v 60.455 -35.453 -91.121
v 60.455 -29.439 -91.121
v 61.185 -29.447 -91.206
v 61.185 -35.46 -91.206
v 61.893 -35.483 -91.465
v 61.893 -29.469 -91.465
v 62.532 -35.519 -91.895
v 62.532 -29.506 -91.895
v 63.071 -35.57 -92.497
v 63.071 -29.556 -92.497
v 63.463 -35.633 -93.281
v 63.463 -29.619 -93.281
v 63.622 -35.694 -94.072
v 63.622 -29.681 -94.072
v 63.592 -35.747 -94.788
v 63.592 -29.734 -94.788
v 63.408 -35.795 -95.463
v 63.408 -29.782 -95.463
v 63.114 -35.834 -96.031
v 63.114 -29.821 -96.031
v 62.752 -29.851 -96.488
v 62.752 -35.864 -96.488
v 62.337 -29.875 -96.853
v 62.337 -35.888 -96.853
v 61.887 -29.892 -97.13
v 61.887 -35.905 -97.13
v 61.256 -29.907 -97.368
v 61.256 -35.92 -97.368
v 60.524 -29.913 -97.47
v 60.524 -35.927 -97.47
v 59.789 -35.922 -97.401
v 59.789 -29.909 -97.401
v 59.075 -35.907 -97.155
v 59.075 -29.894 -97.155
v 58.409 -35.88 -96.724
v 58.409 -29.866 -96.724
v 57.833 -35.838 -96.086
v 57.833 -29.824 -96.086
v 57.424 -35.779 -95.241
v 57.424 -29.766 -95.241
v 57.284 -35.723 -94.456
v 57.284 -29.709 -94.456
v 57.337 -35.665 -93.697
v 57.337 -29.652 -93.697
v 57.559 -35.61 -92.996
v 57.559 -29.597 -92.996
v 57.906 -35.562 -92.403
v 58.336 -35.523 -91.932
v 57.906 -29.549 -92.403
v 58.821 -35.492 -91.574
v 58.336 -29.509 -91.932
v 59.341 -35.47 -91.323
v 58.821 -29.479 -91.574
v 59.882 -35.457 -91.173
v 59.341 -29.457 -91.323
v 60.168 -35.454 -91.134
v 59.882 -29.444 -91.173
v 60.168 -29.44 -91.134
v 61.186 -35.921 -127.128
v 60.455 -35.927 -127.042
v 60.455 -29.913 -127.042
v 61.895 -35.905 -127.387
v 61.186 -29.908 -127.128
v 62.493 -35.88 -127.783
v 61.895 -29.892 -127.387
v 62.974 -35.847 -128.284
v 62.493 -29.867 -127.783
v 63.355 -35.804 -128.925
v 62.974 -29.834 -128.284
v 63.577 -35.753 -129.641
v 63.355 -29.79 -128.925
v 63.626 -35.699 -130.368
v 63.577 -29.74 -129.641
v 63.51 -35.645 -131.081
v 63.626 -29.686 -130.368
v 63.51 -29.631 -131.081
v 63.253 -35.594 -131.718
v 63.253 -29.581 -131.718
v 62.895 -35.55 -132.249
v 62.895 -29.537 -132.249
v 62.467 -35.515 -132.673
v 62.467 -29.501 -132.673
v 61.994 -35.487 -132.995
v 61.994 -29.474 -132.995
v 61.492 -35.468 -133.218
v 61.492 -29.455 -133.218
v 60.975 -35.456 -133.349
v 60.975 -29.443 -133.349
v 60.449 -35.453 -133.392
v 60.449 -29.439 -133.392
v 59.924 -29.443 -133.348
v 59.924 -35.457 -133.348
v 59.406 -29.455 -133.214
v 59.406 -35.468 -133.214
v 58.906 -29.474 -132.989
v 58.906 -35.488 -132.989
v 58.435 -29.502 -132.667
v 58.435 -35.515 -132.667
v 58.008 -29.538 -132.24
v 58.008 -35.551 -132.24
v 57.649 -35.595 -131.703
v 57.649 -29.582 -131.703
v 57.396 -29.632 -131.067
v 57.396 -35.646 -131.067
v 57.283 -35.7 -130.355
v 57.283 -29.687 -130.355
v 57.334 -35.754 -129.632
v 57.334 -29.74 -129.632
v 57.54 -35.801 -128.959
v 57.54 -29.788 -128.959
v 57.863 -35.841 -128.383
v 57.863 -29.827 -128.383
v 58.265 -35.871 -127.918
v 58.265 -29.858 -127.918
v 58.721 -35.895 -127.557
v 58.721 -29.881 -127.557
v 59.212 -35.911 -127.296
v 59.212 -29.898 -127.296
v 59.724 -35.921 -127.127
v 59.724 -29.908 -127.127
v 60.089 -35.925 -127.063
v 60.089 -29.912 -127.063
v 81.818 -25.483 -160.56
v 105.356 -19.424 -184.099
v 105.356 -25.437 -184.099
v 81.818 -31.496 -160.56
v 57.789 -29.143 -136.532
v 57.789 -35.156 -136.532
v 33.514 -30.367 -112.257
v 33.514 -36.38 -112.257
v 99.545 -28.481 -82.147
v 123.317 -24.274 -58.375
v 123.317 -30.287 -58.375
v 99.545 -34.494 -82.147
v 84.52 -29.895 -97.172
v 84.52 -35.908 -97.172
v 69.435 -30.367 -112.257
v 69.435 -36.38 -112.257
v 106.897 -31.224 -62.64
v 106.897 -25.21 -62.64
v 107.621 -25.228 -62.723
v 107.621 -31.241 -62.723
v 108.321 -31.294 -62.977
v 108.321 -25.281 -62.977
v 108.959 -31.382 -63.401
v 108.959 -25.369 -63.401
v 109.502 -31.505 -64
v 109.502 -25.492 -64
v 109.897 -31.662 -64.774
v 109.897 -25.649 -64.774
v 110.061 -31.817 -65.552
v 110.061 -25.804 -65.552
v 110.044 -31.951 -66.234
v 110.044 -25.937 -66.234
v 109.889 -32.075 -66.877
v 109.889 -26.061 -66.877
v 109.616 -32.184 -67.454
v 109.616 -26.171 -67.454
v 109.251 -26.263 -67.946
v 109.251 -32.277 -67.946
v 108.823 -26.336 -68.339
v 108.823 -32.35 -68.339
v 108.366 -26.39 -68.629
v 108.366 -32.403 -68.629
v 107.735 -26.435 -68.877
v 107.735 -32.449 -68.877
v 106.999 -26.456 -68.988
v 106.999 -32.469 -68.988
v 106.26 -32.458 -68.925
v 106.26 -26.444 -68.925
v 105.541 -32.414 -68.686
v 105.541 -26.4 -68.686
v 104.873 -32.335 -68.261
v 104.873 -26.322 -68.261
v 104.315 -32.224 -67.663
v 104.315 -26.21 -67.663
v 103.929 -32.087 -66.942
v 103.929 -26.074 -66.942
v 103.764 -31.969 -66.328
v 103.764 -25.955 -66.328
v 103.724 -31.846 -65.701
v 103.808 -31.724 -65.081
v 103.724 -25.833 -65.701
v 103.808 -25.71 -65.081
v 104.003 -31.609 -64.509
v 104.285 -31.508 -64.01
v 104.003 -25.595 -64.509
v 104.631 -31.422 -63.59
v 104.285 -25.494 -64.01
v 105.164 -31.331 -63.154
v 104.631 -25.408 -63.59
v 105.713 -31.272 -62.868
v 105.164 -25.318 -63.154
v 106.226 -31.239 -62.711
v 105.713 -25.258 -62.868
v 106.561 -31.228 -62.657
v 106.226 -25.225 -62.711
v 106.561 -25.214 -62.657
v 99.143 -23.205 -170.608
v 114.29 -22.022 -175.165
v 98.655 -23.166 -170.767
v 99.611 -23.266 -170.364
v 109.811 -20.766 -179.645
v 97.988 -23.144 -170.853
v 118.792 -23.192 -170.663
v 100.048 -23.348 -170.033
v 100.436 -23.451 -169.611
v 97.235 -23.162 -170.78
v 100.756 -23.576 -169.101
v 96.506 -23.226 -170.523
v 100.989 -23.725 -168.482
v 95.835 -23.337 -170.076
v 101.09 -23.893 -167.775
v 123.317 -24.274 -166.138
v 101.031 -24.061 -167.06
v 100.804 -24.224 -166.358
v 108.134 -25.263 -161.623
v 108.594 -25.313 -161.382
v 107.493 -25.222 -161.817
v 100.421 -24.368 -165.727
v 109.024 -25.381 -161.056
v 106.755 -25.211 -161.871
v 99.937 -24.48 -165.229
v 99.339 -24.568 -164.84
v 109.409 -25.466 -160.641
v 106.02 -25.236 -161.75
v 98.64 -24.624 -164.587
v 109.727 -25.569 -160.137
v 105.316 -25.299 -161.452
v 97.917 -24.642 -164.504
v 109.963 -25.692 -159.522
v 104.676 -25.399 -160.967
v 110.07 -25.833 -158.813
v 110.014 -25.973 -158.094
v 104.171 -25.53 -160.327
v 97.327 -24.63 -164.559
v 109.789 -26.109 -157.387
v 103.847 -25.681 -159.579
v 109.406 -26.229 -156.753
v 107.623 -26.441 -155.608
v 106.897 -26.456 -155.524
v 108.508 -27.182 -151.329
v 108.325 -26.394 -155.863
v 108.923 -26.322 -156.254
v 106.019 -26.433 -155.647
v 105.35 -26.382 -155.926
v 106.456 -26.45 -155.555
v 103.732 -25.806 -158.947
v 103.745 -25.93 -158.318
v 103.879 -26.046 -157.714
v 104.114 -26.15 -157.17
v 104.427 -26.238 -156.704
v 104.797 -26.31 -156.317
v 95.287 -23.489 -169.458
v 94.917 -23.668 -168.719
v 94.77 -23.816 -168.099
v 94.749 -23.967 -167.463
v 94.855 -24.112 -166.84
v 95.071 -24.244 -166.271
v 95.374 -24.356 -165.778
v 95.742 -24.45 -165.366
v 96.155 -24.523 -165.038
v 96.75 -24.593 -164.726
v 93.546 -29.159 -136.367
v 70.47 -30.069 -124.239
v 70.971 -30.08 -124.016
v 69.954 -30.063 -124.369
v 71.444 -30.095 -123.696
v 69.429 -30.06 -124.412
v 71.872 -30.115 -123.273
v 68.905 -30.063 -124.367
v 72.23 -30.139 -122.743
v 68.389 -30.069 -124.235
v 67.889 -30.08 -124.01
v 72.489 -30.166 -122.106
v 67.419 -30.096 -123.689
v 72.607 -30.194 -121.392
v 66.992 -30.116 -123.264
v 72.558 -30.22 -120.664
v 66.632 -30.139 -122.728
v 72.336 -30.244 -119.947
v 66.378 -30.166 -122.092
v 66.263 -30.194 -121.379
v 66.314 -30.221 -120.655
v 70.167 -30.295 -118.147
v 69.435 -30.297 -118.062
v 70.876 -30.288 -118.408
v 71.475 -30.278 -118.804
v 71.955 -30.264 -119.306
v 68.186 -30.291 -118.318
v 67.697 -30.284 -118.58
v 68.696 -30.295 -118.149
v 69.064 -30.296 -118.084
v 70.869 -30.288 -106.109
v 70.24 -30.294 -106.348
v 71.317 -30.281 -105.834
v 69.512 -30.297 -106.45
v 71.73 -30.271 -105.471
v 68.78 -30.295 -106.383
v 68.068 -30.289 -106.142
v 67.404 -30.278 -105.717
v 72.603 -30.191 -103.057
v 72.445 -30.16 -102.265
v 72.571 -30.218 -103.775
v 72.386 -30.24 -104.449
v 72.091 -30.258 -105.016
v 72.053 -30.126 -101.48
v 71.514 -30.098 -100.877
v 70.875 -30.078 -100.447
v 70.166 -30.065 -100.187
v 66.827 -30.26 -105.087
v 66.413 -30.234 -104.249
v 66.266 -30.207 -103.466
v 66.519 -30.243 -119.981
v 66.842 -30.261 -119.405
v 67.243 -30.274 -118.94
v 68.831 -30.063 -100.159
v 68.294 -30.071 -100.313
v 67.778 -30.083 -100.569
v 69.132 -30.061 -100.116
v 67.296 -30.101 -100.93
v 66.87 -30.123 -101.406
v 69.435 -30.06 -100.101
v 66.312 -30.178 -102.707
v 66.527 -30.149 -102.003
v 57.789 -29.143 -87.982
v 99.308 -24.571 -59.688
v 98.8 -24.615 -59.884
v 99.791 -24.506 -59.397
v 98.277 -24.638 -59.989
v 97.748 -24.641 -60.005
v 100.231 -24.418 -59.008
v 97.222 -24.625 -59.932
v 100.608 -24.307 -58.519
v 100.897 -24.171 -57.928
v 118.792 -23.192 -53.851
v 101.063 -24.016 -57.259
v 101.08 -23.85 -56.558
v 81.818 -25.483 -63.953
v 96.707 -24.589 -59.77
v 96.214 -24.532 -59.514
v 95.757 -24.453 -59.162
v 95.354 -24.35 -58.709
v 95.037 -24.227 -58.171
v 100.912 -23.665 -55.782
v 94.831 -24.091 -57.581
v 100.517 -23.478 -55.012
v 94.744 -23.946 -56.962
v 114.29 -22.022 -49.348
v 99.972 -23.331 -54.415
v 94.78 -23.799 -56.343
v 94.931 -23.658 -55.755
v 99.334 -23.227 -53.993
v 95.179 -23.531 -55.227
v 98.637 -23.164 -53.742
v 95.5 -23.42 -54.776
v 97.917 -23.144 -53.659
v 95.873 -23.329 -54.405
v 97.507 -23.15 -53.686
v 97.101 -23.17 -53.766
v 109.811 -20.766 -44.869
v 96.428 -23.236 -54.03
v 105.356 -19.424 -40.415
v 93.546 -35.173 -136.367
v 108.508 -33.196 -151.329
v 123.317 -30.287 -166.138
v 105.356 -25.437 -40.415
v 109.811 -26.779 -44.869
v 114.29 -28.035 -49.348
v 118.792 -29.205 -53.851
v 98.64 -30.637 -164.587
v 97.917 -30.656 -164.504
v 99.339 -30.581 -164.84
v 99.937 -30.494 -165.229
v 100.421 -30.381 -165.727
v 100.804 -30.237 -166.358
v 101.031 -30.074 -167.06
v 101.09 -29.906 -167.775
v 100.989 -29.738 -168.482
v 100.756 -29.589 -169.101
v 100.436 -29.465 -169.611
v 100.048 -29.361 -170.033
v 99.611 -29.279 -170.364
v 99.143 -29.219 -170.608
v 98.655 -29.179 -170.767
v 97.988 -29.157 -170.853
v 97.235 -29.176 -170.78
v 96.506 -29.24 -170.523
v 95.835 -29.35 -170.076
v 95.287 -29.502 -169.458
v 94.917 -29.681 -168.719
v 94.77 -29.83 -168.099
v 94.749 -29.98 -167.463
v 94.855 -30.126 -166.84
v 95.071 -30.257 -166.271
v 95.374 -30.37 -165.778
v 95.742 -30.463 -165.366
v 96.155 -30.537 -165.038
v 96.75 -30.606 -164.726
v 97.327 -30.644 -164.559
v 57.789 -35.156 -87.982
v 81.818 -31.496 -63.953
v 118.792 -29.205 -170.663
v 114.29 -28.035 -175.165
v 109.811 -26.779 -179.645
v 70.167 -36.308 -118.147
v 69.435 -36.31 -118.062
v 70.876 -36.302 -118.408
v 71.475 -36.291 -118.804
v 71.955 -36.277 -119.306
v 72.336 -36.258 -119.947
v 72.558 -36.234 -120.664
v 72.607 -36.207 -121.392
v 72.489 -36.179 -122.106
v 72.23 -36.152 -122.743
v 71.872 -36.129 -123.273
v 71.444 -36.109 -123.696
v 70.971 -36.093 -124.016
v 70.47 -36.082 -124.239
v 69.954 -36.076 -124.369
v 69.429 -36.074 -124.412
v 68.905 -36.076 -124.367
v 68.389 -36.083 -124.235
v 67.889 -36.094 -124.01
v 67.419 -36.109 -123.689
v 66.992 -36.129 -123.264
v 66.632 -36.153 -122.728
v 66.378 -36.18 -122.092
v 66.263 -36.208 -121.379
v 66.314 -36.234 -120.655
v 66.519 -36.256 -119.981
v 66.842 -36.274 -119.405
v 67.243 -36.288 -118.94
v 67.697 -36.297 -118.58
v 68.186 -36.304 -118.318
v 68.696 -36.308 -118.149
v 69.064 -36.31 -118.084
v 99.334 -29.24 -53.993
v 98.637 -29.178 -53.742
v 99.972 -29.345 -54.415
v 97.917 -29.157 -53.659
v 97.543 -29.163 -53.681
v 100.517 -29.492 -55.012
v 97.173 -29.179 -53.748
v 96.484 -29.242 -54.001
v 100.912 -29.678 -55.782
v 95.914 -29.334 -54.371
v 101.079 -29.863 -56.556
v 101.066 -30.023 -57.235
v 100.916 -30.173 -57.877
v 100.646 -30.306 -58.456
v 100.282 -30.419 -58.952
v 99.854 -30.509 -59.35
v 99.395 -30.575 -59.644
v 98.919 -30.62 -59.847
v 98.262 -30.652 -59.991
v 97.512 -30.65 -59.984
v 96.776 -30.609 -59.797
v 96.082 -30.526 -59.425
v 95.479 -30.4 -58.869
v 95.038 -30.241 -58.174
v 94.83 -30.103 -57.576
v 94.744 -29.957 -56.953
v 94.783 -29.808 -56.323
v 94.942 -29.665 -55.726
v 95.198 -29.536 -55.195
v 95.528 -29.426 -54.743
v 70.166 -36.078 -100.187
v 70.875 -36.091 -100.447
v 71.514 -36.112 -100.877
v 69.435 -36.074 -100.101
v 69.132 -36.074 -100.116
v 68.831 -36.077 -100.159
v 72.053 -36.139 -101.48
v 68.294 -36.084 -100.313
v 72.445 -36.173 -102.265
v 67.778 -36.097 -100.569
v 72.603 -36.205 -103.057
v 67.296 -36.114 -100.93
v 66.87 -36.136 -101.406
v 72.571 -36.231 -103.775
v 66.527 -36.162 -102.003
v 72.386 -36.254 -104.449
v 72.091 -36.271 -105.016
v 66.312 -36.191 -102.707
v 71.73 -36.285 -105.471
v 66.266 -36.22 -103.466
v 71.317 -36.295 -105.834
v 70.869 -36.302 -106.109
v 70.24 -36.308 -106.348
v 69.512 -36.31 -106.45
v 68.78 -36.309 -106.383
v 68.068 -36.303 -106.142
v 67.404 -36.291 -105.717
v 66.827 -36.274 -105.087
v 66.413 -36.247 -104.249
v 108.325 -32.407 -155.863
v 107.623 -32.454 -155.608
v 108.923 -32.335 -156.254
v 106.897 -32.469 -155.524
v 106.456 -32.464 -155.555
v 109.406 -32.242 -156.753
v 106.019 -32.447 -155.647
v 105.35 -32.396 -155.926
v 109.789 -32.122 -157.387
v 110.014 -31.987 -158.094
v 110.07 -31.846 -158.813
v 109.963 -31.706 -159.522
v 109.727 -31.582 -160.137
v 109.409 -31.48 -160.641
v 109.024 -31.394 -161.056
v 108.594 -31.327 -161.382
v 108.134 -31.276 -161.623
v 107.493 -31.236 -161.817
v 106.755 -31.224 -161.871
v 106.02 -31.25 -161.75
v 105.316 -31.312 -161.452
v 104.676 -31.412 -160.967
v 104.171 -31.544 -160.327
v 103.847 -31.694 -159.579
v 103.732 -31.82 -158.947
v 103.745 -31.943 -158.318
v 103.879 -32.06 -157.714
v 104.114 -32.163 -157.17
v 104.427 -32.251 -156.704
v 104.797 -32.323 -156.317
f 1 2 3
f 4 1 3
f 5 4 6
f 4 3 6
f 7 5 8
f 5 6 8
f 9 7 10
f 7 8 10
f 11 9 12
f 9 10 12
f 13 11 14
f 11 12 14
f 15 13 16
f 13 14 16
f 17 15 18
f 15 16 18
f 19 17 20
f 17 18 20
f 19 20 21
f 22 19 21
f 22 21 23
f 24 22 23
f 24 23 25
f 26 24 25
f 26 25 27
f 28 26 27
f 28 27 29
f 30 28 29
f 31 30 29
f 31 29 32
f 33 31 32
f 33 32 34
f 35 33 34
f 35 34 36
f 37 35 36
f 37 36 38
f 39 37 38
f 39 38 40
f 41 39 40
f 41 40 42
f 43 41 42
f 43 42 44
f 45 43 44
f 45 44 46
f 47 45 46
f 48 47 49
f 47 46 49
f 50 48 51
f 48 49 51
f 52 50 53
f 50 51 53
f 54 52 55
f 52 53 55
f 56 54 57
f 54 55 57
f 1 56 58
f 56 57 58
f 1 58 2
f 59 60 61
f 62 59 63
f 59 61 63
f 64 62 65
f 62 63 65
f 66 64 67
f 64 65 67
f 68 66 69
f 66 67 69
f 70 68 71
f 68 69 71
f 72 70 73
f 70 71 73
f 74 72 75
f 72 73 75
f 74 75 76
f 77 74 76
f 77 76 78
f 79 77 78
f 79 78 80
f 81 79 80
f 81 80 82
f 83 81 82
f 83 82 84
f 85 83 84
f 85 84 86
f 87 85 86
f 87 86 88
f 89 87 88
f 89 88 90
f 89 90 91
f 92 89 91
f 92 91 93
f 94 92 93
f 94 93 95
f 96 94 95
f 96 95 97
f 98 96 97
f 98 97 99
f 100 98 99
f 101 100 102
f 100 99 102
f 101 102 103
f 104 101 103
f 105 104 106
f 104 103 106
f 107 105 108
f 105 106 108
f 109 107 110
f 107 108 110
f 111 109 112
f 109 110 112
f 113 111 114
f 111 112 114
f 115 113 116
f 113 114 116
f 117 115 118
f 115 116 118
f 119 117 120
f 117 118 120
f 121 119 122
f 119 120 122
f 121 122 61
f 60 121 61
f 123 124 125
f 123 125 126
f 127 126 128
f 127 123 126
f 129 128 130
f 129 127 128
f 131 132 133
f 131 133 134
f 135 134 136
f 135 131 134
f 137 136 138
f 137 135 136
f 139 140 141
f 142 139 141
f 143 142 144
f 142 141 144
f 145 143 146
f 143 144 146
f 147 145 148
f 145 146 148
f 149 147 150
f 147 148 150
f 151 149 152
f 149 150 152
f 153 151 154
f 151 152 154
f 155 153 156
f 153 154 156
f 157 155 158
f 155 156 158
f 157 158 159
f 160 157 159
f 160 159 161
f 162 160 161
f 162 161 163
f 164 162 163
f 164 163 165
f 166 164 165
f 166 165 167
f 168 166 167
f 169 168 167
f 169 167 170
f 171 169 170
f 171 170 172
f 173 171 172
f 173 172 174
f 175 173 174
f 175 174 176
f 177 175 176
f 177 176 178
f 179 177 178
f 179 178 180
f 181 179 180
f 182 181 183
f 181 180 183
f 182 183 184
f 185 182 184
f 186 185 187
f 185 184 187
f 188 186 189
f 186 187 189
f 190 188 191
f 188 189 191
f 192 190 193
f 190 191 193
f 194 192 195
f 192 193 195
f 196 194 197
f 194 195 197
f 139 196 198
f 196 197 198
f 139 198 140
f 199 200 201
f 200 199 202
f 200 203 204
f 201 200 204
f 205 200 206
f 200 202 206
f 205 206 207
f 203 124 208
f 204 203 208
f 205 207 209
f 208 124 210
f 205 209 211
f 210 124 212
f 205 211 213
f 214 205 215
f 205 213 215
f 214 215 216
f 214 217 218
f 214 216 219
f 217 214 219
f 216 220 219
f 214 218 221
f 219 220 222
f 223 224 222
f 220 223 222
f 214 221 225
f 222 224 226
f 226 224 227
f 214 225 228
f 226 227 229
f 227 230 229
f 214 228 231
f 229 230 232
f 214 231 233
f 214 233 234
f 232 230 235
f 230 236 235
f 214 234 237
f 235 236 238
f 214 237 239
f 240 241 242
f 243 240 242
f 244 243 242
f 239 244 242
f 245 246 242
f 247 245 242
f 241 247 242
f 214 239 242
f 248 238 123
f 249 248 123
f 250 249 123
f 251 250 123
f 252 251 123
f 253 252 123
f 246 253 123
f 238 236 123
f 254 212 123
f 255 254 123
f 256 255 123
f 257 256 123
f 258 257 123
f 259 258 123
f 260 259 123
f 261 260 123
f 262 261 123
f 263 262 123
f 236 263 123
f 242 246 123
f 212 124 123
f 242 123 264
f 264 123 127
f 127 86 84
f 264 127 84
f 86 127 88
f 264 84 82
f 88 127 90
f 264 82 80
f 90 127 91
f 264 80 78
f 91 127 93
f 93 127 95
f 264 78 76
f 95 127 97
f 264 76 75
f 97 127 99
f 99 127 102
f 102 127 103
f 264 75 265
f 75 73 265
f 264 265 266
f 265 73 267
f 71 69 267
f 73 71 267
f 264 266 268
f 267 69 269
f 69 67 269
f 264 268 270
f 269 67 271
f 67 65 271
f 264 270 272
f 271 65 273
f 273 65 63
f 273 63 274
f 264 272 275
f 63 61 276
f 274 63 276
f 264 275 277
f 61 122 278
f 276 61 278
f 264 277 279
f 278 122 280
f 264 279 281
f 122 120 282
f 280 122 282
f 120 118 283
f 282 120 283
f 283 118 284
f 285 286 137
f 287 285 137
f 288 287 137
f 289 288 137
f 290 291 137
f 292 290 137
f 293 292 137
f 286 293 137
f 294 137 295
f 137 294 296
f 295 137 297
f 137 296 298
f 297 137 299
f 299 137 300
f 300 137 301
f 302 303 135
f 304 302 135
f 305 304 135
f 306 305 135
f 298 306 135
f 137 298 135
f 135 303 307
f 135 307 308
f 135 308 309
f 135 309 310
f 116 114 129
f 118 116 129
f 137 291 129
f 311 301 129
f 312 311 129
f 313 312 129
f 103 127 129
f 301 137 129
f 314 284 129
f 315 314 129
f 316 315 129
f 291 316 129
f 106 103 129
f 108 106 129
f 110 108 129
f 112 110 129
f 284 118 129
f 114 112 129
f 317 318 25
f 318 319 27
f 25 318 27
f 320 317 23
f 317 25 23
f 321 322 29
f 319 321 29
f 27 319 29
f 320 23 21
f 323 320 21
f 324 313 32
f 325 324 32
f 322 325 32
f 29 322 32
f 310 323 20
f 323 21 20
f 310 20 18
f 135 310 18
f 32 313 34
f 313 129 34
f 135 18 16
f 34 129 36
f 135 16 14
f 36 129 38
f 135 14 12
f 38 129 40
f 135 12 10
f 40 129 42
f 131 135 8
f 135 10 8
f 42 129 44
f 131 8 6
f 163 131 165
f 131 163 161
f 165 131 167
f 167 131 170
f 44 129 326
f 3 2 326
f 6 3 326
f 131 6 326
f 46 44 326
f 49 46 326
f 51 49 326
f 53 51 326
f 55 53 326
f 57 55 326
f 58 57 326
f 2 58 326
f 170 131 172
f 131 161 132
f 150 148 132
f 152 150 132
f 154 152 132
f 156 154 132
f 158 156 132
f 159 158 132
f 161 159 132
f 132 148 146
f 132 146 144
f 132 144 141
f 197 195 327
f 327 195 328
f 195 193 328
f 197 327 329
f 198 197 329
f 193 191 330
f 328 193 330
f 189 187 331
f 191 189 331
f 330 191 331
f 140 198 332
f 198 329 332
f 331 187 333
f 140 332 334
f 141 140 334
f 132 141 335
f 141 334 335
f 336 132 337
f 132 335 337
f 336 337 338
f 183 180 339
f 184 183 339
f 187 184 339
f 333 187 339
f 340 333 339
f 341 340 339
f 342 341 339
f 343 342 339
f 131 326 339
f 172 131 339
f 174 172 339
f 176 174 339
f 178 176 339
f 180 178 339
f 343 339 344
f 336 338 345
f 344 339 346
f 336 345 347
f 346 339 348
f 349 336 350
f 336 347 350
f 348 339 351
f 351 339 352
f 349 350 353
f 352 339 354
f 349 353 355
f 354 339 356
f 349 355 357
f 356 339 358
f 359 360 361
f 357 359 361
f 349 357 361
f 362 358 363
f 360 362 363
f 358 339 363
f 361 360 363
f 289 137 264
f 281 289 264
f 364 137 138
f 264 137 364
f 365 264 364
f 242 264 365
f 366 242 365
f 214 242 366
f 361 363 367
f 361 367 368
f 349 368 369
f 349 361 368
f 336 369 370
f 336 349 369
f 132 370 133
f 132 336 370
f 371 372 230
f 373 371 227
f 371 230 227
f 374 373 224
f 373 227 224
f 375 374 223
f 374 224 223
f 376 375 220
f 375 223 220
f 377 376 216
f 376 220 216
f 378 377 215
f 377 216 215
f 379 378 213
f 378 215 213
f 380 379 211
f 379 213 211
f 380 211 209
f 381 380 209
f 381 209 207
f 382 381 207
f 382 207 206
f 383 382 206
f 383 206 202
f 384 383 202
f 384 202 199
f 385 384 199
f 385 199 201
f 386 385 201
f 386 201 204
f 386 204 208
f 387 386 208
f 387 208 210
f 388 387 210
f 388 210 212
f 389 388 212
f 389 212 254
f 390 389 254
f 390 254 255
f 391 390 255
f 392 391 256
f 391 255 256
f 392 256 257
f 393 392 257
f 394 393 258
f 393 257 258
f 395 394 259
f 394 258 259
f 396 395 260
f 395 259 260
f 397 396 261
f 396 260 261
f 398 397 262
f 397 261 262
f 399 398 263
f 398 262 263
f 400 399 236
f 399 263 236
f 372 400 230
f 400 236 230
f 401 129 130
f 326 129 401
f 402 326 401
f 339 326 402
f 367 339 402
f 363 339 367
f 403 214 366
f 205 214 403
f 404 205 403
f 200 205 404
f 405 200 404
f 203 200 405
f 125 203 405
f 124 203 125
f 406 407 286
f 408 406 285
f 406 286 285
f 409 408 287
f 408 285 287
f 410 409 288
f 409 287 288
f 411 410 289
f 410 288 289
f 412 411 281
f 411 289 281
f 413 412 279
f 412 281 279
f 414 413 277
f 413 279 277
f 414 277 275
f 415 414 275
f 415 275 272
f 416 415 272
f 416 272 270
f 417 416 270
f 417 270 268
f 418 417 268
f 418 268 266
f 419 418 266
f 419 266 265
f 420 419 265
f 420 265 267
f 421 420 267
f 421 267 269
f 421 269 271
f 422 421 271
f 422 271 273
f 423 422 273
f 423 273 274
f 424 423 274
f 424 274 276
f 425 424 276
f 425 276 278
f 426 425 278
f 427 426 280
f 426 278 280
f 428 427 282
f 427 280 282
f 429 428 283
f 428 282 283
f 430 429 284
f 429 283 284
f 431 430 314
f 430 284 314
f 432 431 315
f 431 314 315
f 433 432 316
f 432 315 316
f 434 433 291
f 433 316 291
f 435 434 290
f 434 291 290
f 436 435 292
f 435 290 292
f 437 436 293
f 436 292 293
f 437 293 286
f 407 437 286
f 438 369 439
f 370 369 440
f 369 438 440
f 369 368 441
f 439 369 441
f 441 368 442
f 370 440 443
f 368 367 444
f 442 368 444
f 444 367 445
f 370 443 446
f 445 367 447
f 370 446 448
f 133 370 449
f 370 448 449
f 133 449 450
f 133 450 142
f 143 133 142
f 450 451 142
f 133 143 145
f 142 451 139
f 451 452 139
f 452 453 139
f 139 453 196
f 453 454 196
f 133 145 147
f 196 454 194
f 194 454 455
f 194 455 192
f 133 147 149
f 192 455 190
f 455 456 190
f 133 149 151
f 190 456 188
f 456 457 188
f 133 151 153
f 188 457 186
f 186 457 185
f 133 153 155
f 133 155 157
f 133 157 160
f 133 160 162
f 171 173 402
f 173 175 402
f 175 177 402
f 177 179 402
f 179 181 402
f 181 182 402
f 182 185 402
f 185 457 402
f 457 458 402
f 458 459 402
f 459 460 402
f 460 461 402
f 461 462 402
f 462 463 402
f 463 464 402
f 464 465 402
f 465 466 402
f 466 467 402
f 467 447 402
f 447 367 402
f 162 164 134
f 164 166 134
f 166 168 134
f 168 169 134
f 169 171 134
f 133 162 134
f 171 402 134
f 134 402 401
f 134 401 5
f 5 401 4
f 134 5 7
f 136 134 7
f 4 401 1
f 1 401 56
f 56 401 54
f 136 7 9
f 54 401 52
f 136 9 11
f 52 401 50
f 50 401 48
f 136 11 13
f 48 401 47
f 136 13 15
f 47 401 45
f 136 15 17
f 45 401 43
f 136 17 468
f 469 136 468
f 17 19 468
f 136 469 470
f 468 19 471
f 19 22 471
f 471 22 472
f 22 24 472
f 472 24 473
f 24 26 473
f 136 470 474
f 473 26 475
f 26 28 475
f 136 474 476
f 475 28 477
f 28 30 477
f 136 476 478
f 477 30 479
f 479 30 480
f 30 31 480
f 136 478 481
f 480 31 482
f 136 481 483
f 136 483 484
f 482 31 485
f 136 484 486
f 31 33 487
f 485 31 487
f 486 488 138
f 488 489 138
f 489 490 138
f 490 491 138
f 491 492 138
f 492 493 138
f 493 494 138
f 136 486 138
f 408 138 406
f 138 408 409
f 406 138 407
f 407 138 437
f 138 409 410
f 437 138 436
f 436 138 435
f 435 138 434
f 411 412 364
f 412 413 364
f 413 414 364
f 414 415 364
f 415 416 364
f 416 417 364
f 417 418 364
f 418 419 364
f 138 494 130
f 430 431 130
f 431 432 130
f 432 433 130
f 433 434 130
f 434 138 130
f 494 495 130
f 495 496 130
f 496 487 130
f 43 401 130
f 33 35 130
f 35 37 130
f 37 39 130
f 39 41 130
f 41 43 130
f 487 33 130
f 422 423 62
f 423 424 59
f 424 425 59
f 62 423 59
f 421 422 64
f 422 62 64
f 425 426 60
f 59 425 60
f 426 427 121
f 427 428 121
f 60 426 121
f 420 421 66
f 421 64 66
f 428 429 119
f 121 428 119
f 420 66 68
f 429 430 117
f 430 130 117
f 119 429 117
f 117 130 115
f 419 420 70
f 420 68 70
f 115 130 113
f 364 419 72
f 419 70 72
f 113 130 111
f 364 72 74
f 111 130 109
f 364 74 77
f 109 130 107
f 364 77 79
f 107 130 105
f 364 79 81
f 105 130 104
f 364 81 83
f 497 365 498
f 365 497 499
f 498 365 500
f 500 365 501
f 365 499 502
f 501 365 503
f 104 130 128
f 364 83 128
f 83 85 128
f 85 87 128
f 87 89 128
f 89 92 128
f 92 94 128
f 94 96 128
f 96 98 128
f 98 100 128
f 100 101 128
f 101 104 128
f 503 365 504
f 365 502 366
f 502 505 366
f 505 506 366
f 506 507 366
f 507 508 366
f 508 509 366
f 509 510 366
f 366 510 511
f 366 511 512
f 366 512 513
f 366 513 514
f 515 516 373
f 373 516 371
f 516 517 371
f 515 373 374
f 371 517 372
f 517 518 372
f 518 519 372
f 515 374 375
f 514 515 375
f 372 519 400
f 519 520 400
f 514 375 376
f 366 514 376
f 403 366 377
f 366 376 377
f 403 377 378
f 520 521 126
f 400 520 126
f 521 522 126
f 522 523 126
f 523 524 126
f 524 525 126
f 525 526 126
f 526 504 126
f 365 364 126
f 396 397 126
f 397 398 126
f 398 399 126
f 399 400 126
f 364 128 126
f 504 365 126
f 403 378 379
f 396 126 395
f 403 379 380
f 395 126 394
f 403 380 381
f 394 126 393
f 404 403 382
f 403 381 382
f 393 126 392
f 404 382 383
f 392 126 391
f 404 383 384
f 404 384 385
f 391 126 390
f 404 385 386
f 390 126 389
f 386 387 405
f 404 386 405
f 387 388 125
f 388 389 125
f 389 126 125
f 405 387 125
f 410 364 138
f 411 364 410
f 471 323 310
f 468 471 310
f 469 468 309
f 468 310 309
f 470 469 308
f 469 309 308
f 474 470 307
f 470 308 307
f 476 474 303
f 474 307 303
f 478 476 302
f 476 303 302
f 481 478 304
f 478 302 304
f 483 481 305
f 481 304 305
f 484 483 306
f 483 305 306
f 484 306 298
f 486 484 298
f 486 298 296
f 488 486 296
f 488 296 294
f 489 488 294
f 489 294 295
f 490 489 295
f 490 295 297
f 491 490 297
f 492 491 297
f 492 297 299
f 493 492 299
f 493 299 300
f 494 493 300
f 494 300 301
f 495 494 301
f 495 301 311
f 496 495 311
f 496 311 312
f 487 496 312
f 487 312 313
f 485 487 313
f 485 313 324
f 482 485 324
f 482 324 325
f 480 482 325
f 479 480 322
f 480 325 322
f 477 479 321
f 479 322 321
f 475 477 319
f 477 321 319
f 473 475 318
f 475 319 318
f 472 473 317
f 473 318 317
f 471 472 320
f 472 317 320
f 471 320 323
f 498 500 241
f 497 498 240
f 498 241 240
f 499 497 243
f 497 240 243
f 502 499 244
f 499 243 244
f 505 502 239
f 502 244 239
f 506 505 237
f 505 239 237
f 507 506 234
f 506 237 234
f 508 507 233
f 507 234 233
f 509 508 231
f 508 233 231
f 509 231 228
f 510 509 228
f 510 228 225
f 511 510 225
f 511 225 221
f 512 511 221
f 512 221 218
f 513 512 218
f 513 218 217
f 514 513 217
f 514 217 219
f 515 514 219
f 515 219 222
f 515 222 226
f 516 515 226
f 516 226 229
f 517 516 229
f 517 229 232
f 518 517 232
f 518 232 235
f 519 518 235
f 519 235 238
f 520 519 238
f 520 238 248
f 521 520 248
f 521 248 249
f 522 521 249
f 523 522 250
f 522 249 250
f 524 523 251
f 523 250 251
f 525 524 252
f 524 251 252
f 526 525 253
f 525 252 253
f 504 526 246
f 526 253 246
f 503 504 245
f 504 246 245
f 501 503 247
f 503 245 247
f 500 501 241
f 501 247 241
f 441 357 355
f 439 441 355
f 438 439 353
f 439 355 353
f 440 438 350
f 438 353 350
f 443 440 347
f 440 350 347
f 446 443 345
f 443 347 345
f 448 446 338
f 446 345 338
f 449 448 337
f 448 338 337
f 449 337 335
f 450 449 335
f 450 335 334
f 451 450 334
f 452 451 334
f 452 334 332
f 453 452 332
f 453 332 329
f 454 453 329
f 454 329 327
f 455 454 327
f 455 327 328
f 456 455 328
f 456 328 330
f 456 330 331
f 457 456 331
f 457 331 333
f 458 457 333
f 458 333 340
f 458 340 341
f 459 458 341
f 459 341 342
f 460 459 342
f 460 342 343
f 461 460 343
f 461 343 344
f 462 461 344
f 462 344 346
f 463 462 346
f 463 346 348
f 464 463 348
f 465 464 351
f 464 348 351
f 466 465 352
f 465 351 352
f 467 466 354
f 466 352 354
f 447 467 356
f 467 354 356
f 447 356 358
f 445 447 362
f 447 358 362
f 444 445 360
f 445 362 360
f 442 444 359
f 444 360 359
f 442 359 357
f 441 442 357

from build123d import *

# Parameters (mm, degrees)
BOSS_EXTRUDE4_DEPTH = 304.8
SKETCH4_OUTSIDE_W   = 384.928
SKETCH4_OUTSIDE_H   = 321.428
CUT_EXTRUDE2_DEPTH  = 150
SKETCH6_R           = 3.175
CUT_EXTRUDE5_DEPTH  = 150


with BuildPart() as part:
    # Sketch3 → Boss-Extrude4 (new body)
    with BuildSketch(Plane(origin=(0, 0, 0), x_dir=(0, 0, -1), z_dir=(1, 0, 0))):
        with BuildLine():
            ThreePointArc((232.90669496, 1.961354585), (112.25669496, -30.366715482), (-8.39330504, 1.961354585))
            Line((-8.39330504, 1.961354585), (-8.39330504, -4.052041589))
            ThreePointArc((-8.39330504, -4.052041589), (112.25669496, -36.380111656), (232.90669496, -4.052041589))
            Line((232.90669496, -4.052041589), (232.90669496, 1.961354585))
        make_face()
    extrude(amount=BOSS_EXTRUDE4_DEPTH)

    # Sketch4 outside → Cut-Extrude2 (cut)
    with BuildSketch(Plane(origin=(0, 1.961354585, 0), x_dir=(1, 0, 0), z_dir=(0, 1, 0))):
        with Locations((152.4, 112.257)):
            Rectangle(SKETCH4_OUTSIDE_W, SKETCH4_OUTSIDE_H)
        Polygon((105.356331211, 184.098739751), (33.514261355, 112.256736733), (105.356310324, 40.414687765), (123.316822566, 58.375200007), (69.435327613, 112.25669496), (123.316851808, 166.138219154), align=None, mode=Mode.SUBTRACT)
    extrude(amount=-CUT_EXTRUDE2_DEPTH, mode=Mode.SUBTRACT)

    # Sketch6 → Cut-Extrude5 (cut)
    with BuildSketch(Plane(origin=(0, 1.961354585, 0), x_dir=(1, 0, 0), z_dir=(0, 1, 0))):
        with Locations(Location((97.916821174, 167.678955491, 0), (0, 0, 270))):
            Circle(SKETCH6_R)
        with Locations(Location((106.897078687, 158.698700762, 0), (0, 0, 270))):
            Circle(SKETCH6_R)
        with Locations(Location((60.455057568, 130.217250368, 0), (0, 0, 270))):
            Circle(SKETCH6_R)
        with Locations(Location((69.435303942, 121.2369845, 0), (0, 0, 270))):
            Circle(SKETCH6_R)
        with Locations(Location((60.455015794, 94.296160438, 0), (0, 0, 270))):
            Circle(SKETCH6_R)
        with Locations(Location((69.435283055, 103.27640542, 0), (0, 0, 270))):
            Circle(SKETCH6_R)
        with Locations(Location((106.89697067, 65.814602027, 0), (0, 0, 270))):
            Circle(SKETCH6_R)
        with Locations(Location((97.916692269, 56.834368185, 0), (0, 0, 270))):
            Circle(SKETCH6_R)
    extrude(amount=-CUT_EXTRUDE5_DEPTH, mode=Mode.SUBTRACT)


solid = part.part
